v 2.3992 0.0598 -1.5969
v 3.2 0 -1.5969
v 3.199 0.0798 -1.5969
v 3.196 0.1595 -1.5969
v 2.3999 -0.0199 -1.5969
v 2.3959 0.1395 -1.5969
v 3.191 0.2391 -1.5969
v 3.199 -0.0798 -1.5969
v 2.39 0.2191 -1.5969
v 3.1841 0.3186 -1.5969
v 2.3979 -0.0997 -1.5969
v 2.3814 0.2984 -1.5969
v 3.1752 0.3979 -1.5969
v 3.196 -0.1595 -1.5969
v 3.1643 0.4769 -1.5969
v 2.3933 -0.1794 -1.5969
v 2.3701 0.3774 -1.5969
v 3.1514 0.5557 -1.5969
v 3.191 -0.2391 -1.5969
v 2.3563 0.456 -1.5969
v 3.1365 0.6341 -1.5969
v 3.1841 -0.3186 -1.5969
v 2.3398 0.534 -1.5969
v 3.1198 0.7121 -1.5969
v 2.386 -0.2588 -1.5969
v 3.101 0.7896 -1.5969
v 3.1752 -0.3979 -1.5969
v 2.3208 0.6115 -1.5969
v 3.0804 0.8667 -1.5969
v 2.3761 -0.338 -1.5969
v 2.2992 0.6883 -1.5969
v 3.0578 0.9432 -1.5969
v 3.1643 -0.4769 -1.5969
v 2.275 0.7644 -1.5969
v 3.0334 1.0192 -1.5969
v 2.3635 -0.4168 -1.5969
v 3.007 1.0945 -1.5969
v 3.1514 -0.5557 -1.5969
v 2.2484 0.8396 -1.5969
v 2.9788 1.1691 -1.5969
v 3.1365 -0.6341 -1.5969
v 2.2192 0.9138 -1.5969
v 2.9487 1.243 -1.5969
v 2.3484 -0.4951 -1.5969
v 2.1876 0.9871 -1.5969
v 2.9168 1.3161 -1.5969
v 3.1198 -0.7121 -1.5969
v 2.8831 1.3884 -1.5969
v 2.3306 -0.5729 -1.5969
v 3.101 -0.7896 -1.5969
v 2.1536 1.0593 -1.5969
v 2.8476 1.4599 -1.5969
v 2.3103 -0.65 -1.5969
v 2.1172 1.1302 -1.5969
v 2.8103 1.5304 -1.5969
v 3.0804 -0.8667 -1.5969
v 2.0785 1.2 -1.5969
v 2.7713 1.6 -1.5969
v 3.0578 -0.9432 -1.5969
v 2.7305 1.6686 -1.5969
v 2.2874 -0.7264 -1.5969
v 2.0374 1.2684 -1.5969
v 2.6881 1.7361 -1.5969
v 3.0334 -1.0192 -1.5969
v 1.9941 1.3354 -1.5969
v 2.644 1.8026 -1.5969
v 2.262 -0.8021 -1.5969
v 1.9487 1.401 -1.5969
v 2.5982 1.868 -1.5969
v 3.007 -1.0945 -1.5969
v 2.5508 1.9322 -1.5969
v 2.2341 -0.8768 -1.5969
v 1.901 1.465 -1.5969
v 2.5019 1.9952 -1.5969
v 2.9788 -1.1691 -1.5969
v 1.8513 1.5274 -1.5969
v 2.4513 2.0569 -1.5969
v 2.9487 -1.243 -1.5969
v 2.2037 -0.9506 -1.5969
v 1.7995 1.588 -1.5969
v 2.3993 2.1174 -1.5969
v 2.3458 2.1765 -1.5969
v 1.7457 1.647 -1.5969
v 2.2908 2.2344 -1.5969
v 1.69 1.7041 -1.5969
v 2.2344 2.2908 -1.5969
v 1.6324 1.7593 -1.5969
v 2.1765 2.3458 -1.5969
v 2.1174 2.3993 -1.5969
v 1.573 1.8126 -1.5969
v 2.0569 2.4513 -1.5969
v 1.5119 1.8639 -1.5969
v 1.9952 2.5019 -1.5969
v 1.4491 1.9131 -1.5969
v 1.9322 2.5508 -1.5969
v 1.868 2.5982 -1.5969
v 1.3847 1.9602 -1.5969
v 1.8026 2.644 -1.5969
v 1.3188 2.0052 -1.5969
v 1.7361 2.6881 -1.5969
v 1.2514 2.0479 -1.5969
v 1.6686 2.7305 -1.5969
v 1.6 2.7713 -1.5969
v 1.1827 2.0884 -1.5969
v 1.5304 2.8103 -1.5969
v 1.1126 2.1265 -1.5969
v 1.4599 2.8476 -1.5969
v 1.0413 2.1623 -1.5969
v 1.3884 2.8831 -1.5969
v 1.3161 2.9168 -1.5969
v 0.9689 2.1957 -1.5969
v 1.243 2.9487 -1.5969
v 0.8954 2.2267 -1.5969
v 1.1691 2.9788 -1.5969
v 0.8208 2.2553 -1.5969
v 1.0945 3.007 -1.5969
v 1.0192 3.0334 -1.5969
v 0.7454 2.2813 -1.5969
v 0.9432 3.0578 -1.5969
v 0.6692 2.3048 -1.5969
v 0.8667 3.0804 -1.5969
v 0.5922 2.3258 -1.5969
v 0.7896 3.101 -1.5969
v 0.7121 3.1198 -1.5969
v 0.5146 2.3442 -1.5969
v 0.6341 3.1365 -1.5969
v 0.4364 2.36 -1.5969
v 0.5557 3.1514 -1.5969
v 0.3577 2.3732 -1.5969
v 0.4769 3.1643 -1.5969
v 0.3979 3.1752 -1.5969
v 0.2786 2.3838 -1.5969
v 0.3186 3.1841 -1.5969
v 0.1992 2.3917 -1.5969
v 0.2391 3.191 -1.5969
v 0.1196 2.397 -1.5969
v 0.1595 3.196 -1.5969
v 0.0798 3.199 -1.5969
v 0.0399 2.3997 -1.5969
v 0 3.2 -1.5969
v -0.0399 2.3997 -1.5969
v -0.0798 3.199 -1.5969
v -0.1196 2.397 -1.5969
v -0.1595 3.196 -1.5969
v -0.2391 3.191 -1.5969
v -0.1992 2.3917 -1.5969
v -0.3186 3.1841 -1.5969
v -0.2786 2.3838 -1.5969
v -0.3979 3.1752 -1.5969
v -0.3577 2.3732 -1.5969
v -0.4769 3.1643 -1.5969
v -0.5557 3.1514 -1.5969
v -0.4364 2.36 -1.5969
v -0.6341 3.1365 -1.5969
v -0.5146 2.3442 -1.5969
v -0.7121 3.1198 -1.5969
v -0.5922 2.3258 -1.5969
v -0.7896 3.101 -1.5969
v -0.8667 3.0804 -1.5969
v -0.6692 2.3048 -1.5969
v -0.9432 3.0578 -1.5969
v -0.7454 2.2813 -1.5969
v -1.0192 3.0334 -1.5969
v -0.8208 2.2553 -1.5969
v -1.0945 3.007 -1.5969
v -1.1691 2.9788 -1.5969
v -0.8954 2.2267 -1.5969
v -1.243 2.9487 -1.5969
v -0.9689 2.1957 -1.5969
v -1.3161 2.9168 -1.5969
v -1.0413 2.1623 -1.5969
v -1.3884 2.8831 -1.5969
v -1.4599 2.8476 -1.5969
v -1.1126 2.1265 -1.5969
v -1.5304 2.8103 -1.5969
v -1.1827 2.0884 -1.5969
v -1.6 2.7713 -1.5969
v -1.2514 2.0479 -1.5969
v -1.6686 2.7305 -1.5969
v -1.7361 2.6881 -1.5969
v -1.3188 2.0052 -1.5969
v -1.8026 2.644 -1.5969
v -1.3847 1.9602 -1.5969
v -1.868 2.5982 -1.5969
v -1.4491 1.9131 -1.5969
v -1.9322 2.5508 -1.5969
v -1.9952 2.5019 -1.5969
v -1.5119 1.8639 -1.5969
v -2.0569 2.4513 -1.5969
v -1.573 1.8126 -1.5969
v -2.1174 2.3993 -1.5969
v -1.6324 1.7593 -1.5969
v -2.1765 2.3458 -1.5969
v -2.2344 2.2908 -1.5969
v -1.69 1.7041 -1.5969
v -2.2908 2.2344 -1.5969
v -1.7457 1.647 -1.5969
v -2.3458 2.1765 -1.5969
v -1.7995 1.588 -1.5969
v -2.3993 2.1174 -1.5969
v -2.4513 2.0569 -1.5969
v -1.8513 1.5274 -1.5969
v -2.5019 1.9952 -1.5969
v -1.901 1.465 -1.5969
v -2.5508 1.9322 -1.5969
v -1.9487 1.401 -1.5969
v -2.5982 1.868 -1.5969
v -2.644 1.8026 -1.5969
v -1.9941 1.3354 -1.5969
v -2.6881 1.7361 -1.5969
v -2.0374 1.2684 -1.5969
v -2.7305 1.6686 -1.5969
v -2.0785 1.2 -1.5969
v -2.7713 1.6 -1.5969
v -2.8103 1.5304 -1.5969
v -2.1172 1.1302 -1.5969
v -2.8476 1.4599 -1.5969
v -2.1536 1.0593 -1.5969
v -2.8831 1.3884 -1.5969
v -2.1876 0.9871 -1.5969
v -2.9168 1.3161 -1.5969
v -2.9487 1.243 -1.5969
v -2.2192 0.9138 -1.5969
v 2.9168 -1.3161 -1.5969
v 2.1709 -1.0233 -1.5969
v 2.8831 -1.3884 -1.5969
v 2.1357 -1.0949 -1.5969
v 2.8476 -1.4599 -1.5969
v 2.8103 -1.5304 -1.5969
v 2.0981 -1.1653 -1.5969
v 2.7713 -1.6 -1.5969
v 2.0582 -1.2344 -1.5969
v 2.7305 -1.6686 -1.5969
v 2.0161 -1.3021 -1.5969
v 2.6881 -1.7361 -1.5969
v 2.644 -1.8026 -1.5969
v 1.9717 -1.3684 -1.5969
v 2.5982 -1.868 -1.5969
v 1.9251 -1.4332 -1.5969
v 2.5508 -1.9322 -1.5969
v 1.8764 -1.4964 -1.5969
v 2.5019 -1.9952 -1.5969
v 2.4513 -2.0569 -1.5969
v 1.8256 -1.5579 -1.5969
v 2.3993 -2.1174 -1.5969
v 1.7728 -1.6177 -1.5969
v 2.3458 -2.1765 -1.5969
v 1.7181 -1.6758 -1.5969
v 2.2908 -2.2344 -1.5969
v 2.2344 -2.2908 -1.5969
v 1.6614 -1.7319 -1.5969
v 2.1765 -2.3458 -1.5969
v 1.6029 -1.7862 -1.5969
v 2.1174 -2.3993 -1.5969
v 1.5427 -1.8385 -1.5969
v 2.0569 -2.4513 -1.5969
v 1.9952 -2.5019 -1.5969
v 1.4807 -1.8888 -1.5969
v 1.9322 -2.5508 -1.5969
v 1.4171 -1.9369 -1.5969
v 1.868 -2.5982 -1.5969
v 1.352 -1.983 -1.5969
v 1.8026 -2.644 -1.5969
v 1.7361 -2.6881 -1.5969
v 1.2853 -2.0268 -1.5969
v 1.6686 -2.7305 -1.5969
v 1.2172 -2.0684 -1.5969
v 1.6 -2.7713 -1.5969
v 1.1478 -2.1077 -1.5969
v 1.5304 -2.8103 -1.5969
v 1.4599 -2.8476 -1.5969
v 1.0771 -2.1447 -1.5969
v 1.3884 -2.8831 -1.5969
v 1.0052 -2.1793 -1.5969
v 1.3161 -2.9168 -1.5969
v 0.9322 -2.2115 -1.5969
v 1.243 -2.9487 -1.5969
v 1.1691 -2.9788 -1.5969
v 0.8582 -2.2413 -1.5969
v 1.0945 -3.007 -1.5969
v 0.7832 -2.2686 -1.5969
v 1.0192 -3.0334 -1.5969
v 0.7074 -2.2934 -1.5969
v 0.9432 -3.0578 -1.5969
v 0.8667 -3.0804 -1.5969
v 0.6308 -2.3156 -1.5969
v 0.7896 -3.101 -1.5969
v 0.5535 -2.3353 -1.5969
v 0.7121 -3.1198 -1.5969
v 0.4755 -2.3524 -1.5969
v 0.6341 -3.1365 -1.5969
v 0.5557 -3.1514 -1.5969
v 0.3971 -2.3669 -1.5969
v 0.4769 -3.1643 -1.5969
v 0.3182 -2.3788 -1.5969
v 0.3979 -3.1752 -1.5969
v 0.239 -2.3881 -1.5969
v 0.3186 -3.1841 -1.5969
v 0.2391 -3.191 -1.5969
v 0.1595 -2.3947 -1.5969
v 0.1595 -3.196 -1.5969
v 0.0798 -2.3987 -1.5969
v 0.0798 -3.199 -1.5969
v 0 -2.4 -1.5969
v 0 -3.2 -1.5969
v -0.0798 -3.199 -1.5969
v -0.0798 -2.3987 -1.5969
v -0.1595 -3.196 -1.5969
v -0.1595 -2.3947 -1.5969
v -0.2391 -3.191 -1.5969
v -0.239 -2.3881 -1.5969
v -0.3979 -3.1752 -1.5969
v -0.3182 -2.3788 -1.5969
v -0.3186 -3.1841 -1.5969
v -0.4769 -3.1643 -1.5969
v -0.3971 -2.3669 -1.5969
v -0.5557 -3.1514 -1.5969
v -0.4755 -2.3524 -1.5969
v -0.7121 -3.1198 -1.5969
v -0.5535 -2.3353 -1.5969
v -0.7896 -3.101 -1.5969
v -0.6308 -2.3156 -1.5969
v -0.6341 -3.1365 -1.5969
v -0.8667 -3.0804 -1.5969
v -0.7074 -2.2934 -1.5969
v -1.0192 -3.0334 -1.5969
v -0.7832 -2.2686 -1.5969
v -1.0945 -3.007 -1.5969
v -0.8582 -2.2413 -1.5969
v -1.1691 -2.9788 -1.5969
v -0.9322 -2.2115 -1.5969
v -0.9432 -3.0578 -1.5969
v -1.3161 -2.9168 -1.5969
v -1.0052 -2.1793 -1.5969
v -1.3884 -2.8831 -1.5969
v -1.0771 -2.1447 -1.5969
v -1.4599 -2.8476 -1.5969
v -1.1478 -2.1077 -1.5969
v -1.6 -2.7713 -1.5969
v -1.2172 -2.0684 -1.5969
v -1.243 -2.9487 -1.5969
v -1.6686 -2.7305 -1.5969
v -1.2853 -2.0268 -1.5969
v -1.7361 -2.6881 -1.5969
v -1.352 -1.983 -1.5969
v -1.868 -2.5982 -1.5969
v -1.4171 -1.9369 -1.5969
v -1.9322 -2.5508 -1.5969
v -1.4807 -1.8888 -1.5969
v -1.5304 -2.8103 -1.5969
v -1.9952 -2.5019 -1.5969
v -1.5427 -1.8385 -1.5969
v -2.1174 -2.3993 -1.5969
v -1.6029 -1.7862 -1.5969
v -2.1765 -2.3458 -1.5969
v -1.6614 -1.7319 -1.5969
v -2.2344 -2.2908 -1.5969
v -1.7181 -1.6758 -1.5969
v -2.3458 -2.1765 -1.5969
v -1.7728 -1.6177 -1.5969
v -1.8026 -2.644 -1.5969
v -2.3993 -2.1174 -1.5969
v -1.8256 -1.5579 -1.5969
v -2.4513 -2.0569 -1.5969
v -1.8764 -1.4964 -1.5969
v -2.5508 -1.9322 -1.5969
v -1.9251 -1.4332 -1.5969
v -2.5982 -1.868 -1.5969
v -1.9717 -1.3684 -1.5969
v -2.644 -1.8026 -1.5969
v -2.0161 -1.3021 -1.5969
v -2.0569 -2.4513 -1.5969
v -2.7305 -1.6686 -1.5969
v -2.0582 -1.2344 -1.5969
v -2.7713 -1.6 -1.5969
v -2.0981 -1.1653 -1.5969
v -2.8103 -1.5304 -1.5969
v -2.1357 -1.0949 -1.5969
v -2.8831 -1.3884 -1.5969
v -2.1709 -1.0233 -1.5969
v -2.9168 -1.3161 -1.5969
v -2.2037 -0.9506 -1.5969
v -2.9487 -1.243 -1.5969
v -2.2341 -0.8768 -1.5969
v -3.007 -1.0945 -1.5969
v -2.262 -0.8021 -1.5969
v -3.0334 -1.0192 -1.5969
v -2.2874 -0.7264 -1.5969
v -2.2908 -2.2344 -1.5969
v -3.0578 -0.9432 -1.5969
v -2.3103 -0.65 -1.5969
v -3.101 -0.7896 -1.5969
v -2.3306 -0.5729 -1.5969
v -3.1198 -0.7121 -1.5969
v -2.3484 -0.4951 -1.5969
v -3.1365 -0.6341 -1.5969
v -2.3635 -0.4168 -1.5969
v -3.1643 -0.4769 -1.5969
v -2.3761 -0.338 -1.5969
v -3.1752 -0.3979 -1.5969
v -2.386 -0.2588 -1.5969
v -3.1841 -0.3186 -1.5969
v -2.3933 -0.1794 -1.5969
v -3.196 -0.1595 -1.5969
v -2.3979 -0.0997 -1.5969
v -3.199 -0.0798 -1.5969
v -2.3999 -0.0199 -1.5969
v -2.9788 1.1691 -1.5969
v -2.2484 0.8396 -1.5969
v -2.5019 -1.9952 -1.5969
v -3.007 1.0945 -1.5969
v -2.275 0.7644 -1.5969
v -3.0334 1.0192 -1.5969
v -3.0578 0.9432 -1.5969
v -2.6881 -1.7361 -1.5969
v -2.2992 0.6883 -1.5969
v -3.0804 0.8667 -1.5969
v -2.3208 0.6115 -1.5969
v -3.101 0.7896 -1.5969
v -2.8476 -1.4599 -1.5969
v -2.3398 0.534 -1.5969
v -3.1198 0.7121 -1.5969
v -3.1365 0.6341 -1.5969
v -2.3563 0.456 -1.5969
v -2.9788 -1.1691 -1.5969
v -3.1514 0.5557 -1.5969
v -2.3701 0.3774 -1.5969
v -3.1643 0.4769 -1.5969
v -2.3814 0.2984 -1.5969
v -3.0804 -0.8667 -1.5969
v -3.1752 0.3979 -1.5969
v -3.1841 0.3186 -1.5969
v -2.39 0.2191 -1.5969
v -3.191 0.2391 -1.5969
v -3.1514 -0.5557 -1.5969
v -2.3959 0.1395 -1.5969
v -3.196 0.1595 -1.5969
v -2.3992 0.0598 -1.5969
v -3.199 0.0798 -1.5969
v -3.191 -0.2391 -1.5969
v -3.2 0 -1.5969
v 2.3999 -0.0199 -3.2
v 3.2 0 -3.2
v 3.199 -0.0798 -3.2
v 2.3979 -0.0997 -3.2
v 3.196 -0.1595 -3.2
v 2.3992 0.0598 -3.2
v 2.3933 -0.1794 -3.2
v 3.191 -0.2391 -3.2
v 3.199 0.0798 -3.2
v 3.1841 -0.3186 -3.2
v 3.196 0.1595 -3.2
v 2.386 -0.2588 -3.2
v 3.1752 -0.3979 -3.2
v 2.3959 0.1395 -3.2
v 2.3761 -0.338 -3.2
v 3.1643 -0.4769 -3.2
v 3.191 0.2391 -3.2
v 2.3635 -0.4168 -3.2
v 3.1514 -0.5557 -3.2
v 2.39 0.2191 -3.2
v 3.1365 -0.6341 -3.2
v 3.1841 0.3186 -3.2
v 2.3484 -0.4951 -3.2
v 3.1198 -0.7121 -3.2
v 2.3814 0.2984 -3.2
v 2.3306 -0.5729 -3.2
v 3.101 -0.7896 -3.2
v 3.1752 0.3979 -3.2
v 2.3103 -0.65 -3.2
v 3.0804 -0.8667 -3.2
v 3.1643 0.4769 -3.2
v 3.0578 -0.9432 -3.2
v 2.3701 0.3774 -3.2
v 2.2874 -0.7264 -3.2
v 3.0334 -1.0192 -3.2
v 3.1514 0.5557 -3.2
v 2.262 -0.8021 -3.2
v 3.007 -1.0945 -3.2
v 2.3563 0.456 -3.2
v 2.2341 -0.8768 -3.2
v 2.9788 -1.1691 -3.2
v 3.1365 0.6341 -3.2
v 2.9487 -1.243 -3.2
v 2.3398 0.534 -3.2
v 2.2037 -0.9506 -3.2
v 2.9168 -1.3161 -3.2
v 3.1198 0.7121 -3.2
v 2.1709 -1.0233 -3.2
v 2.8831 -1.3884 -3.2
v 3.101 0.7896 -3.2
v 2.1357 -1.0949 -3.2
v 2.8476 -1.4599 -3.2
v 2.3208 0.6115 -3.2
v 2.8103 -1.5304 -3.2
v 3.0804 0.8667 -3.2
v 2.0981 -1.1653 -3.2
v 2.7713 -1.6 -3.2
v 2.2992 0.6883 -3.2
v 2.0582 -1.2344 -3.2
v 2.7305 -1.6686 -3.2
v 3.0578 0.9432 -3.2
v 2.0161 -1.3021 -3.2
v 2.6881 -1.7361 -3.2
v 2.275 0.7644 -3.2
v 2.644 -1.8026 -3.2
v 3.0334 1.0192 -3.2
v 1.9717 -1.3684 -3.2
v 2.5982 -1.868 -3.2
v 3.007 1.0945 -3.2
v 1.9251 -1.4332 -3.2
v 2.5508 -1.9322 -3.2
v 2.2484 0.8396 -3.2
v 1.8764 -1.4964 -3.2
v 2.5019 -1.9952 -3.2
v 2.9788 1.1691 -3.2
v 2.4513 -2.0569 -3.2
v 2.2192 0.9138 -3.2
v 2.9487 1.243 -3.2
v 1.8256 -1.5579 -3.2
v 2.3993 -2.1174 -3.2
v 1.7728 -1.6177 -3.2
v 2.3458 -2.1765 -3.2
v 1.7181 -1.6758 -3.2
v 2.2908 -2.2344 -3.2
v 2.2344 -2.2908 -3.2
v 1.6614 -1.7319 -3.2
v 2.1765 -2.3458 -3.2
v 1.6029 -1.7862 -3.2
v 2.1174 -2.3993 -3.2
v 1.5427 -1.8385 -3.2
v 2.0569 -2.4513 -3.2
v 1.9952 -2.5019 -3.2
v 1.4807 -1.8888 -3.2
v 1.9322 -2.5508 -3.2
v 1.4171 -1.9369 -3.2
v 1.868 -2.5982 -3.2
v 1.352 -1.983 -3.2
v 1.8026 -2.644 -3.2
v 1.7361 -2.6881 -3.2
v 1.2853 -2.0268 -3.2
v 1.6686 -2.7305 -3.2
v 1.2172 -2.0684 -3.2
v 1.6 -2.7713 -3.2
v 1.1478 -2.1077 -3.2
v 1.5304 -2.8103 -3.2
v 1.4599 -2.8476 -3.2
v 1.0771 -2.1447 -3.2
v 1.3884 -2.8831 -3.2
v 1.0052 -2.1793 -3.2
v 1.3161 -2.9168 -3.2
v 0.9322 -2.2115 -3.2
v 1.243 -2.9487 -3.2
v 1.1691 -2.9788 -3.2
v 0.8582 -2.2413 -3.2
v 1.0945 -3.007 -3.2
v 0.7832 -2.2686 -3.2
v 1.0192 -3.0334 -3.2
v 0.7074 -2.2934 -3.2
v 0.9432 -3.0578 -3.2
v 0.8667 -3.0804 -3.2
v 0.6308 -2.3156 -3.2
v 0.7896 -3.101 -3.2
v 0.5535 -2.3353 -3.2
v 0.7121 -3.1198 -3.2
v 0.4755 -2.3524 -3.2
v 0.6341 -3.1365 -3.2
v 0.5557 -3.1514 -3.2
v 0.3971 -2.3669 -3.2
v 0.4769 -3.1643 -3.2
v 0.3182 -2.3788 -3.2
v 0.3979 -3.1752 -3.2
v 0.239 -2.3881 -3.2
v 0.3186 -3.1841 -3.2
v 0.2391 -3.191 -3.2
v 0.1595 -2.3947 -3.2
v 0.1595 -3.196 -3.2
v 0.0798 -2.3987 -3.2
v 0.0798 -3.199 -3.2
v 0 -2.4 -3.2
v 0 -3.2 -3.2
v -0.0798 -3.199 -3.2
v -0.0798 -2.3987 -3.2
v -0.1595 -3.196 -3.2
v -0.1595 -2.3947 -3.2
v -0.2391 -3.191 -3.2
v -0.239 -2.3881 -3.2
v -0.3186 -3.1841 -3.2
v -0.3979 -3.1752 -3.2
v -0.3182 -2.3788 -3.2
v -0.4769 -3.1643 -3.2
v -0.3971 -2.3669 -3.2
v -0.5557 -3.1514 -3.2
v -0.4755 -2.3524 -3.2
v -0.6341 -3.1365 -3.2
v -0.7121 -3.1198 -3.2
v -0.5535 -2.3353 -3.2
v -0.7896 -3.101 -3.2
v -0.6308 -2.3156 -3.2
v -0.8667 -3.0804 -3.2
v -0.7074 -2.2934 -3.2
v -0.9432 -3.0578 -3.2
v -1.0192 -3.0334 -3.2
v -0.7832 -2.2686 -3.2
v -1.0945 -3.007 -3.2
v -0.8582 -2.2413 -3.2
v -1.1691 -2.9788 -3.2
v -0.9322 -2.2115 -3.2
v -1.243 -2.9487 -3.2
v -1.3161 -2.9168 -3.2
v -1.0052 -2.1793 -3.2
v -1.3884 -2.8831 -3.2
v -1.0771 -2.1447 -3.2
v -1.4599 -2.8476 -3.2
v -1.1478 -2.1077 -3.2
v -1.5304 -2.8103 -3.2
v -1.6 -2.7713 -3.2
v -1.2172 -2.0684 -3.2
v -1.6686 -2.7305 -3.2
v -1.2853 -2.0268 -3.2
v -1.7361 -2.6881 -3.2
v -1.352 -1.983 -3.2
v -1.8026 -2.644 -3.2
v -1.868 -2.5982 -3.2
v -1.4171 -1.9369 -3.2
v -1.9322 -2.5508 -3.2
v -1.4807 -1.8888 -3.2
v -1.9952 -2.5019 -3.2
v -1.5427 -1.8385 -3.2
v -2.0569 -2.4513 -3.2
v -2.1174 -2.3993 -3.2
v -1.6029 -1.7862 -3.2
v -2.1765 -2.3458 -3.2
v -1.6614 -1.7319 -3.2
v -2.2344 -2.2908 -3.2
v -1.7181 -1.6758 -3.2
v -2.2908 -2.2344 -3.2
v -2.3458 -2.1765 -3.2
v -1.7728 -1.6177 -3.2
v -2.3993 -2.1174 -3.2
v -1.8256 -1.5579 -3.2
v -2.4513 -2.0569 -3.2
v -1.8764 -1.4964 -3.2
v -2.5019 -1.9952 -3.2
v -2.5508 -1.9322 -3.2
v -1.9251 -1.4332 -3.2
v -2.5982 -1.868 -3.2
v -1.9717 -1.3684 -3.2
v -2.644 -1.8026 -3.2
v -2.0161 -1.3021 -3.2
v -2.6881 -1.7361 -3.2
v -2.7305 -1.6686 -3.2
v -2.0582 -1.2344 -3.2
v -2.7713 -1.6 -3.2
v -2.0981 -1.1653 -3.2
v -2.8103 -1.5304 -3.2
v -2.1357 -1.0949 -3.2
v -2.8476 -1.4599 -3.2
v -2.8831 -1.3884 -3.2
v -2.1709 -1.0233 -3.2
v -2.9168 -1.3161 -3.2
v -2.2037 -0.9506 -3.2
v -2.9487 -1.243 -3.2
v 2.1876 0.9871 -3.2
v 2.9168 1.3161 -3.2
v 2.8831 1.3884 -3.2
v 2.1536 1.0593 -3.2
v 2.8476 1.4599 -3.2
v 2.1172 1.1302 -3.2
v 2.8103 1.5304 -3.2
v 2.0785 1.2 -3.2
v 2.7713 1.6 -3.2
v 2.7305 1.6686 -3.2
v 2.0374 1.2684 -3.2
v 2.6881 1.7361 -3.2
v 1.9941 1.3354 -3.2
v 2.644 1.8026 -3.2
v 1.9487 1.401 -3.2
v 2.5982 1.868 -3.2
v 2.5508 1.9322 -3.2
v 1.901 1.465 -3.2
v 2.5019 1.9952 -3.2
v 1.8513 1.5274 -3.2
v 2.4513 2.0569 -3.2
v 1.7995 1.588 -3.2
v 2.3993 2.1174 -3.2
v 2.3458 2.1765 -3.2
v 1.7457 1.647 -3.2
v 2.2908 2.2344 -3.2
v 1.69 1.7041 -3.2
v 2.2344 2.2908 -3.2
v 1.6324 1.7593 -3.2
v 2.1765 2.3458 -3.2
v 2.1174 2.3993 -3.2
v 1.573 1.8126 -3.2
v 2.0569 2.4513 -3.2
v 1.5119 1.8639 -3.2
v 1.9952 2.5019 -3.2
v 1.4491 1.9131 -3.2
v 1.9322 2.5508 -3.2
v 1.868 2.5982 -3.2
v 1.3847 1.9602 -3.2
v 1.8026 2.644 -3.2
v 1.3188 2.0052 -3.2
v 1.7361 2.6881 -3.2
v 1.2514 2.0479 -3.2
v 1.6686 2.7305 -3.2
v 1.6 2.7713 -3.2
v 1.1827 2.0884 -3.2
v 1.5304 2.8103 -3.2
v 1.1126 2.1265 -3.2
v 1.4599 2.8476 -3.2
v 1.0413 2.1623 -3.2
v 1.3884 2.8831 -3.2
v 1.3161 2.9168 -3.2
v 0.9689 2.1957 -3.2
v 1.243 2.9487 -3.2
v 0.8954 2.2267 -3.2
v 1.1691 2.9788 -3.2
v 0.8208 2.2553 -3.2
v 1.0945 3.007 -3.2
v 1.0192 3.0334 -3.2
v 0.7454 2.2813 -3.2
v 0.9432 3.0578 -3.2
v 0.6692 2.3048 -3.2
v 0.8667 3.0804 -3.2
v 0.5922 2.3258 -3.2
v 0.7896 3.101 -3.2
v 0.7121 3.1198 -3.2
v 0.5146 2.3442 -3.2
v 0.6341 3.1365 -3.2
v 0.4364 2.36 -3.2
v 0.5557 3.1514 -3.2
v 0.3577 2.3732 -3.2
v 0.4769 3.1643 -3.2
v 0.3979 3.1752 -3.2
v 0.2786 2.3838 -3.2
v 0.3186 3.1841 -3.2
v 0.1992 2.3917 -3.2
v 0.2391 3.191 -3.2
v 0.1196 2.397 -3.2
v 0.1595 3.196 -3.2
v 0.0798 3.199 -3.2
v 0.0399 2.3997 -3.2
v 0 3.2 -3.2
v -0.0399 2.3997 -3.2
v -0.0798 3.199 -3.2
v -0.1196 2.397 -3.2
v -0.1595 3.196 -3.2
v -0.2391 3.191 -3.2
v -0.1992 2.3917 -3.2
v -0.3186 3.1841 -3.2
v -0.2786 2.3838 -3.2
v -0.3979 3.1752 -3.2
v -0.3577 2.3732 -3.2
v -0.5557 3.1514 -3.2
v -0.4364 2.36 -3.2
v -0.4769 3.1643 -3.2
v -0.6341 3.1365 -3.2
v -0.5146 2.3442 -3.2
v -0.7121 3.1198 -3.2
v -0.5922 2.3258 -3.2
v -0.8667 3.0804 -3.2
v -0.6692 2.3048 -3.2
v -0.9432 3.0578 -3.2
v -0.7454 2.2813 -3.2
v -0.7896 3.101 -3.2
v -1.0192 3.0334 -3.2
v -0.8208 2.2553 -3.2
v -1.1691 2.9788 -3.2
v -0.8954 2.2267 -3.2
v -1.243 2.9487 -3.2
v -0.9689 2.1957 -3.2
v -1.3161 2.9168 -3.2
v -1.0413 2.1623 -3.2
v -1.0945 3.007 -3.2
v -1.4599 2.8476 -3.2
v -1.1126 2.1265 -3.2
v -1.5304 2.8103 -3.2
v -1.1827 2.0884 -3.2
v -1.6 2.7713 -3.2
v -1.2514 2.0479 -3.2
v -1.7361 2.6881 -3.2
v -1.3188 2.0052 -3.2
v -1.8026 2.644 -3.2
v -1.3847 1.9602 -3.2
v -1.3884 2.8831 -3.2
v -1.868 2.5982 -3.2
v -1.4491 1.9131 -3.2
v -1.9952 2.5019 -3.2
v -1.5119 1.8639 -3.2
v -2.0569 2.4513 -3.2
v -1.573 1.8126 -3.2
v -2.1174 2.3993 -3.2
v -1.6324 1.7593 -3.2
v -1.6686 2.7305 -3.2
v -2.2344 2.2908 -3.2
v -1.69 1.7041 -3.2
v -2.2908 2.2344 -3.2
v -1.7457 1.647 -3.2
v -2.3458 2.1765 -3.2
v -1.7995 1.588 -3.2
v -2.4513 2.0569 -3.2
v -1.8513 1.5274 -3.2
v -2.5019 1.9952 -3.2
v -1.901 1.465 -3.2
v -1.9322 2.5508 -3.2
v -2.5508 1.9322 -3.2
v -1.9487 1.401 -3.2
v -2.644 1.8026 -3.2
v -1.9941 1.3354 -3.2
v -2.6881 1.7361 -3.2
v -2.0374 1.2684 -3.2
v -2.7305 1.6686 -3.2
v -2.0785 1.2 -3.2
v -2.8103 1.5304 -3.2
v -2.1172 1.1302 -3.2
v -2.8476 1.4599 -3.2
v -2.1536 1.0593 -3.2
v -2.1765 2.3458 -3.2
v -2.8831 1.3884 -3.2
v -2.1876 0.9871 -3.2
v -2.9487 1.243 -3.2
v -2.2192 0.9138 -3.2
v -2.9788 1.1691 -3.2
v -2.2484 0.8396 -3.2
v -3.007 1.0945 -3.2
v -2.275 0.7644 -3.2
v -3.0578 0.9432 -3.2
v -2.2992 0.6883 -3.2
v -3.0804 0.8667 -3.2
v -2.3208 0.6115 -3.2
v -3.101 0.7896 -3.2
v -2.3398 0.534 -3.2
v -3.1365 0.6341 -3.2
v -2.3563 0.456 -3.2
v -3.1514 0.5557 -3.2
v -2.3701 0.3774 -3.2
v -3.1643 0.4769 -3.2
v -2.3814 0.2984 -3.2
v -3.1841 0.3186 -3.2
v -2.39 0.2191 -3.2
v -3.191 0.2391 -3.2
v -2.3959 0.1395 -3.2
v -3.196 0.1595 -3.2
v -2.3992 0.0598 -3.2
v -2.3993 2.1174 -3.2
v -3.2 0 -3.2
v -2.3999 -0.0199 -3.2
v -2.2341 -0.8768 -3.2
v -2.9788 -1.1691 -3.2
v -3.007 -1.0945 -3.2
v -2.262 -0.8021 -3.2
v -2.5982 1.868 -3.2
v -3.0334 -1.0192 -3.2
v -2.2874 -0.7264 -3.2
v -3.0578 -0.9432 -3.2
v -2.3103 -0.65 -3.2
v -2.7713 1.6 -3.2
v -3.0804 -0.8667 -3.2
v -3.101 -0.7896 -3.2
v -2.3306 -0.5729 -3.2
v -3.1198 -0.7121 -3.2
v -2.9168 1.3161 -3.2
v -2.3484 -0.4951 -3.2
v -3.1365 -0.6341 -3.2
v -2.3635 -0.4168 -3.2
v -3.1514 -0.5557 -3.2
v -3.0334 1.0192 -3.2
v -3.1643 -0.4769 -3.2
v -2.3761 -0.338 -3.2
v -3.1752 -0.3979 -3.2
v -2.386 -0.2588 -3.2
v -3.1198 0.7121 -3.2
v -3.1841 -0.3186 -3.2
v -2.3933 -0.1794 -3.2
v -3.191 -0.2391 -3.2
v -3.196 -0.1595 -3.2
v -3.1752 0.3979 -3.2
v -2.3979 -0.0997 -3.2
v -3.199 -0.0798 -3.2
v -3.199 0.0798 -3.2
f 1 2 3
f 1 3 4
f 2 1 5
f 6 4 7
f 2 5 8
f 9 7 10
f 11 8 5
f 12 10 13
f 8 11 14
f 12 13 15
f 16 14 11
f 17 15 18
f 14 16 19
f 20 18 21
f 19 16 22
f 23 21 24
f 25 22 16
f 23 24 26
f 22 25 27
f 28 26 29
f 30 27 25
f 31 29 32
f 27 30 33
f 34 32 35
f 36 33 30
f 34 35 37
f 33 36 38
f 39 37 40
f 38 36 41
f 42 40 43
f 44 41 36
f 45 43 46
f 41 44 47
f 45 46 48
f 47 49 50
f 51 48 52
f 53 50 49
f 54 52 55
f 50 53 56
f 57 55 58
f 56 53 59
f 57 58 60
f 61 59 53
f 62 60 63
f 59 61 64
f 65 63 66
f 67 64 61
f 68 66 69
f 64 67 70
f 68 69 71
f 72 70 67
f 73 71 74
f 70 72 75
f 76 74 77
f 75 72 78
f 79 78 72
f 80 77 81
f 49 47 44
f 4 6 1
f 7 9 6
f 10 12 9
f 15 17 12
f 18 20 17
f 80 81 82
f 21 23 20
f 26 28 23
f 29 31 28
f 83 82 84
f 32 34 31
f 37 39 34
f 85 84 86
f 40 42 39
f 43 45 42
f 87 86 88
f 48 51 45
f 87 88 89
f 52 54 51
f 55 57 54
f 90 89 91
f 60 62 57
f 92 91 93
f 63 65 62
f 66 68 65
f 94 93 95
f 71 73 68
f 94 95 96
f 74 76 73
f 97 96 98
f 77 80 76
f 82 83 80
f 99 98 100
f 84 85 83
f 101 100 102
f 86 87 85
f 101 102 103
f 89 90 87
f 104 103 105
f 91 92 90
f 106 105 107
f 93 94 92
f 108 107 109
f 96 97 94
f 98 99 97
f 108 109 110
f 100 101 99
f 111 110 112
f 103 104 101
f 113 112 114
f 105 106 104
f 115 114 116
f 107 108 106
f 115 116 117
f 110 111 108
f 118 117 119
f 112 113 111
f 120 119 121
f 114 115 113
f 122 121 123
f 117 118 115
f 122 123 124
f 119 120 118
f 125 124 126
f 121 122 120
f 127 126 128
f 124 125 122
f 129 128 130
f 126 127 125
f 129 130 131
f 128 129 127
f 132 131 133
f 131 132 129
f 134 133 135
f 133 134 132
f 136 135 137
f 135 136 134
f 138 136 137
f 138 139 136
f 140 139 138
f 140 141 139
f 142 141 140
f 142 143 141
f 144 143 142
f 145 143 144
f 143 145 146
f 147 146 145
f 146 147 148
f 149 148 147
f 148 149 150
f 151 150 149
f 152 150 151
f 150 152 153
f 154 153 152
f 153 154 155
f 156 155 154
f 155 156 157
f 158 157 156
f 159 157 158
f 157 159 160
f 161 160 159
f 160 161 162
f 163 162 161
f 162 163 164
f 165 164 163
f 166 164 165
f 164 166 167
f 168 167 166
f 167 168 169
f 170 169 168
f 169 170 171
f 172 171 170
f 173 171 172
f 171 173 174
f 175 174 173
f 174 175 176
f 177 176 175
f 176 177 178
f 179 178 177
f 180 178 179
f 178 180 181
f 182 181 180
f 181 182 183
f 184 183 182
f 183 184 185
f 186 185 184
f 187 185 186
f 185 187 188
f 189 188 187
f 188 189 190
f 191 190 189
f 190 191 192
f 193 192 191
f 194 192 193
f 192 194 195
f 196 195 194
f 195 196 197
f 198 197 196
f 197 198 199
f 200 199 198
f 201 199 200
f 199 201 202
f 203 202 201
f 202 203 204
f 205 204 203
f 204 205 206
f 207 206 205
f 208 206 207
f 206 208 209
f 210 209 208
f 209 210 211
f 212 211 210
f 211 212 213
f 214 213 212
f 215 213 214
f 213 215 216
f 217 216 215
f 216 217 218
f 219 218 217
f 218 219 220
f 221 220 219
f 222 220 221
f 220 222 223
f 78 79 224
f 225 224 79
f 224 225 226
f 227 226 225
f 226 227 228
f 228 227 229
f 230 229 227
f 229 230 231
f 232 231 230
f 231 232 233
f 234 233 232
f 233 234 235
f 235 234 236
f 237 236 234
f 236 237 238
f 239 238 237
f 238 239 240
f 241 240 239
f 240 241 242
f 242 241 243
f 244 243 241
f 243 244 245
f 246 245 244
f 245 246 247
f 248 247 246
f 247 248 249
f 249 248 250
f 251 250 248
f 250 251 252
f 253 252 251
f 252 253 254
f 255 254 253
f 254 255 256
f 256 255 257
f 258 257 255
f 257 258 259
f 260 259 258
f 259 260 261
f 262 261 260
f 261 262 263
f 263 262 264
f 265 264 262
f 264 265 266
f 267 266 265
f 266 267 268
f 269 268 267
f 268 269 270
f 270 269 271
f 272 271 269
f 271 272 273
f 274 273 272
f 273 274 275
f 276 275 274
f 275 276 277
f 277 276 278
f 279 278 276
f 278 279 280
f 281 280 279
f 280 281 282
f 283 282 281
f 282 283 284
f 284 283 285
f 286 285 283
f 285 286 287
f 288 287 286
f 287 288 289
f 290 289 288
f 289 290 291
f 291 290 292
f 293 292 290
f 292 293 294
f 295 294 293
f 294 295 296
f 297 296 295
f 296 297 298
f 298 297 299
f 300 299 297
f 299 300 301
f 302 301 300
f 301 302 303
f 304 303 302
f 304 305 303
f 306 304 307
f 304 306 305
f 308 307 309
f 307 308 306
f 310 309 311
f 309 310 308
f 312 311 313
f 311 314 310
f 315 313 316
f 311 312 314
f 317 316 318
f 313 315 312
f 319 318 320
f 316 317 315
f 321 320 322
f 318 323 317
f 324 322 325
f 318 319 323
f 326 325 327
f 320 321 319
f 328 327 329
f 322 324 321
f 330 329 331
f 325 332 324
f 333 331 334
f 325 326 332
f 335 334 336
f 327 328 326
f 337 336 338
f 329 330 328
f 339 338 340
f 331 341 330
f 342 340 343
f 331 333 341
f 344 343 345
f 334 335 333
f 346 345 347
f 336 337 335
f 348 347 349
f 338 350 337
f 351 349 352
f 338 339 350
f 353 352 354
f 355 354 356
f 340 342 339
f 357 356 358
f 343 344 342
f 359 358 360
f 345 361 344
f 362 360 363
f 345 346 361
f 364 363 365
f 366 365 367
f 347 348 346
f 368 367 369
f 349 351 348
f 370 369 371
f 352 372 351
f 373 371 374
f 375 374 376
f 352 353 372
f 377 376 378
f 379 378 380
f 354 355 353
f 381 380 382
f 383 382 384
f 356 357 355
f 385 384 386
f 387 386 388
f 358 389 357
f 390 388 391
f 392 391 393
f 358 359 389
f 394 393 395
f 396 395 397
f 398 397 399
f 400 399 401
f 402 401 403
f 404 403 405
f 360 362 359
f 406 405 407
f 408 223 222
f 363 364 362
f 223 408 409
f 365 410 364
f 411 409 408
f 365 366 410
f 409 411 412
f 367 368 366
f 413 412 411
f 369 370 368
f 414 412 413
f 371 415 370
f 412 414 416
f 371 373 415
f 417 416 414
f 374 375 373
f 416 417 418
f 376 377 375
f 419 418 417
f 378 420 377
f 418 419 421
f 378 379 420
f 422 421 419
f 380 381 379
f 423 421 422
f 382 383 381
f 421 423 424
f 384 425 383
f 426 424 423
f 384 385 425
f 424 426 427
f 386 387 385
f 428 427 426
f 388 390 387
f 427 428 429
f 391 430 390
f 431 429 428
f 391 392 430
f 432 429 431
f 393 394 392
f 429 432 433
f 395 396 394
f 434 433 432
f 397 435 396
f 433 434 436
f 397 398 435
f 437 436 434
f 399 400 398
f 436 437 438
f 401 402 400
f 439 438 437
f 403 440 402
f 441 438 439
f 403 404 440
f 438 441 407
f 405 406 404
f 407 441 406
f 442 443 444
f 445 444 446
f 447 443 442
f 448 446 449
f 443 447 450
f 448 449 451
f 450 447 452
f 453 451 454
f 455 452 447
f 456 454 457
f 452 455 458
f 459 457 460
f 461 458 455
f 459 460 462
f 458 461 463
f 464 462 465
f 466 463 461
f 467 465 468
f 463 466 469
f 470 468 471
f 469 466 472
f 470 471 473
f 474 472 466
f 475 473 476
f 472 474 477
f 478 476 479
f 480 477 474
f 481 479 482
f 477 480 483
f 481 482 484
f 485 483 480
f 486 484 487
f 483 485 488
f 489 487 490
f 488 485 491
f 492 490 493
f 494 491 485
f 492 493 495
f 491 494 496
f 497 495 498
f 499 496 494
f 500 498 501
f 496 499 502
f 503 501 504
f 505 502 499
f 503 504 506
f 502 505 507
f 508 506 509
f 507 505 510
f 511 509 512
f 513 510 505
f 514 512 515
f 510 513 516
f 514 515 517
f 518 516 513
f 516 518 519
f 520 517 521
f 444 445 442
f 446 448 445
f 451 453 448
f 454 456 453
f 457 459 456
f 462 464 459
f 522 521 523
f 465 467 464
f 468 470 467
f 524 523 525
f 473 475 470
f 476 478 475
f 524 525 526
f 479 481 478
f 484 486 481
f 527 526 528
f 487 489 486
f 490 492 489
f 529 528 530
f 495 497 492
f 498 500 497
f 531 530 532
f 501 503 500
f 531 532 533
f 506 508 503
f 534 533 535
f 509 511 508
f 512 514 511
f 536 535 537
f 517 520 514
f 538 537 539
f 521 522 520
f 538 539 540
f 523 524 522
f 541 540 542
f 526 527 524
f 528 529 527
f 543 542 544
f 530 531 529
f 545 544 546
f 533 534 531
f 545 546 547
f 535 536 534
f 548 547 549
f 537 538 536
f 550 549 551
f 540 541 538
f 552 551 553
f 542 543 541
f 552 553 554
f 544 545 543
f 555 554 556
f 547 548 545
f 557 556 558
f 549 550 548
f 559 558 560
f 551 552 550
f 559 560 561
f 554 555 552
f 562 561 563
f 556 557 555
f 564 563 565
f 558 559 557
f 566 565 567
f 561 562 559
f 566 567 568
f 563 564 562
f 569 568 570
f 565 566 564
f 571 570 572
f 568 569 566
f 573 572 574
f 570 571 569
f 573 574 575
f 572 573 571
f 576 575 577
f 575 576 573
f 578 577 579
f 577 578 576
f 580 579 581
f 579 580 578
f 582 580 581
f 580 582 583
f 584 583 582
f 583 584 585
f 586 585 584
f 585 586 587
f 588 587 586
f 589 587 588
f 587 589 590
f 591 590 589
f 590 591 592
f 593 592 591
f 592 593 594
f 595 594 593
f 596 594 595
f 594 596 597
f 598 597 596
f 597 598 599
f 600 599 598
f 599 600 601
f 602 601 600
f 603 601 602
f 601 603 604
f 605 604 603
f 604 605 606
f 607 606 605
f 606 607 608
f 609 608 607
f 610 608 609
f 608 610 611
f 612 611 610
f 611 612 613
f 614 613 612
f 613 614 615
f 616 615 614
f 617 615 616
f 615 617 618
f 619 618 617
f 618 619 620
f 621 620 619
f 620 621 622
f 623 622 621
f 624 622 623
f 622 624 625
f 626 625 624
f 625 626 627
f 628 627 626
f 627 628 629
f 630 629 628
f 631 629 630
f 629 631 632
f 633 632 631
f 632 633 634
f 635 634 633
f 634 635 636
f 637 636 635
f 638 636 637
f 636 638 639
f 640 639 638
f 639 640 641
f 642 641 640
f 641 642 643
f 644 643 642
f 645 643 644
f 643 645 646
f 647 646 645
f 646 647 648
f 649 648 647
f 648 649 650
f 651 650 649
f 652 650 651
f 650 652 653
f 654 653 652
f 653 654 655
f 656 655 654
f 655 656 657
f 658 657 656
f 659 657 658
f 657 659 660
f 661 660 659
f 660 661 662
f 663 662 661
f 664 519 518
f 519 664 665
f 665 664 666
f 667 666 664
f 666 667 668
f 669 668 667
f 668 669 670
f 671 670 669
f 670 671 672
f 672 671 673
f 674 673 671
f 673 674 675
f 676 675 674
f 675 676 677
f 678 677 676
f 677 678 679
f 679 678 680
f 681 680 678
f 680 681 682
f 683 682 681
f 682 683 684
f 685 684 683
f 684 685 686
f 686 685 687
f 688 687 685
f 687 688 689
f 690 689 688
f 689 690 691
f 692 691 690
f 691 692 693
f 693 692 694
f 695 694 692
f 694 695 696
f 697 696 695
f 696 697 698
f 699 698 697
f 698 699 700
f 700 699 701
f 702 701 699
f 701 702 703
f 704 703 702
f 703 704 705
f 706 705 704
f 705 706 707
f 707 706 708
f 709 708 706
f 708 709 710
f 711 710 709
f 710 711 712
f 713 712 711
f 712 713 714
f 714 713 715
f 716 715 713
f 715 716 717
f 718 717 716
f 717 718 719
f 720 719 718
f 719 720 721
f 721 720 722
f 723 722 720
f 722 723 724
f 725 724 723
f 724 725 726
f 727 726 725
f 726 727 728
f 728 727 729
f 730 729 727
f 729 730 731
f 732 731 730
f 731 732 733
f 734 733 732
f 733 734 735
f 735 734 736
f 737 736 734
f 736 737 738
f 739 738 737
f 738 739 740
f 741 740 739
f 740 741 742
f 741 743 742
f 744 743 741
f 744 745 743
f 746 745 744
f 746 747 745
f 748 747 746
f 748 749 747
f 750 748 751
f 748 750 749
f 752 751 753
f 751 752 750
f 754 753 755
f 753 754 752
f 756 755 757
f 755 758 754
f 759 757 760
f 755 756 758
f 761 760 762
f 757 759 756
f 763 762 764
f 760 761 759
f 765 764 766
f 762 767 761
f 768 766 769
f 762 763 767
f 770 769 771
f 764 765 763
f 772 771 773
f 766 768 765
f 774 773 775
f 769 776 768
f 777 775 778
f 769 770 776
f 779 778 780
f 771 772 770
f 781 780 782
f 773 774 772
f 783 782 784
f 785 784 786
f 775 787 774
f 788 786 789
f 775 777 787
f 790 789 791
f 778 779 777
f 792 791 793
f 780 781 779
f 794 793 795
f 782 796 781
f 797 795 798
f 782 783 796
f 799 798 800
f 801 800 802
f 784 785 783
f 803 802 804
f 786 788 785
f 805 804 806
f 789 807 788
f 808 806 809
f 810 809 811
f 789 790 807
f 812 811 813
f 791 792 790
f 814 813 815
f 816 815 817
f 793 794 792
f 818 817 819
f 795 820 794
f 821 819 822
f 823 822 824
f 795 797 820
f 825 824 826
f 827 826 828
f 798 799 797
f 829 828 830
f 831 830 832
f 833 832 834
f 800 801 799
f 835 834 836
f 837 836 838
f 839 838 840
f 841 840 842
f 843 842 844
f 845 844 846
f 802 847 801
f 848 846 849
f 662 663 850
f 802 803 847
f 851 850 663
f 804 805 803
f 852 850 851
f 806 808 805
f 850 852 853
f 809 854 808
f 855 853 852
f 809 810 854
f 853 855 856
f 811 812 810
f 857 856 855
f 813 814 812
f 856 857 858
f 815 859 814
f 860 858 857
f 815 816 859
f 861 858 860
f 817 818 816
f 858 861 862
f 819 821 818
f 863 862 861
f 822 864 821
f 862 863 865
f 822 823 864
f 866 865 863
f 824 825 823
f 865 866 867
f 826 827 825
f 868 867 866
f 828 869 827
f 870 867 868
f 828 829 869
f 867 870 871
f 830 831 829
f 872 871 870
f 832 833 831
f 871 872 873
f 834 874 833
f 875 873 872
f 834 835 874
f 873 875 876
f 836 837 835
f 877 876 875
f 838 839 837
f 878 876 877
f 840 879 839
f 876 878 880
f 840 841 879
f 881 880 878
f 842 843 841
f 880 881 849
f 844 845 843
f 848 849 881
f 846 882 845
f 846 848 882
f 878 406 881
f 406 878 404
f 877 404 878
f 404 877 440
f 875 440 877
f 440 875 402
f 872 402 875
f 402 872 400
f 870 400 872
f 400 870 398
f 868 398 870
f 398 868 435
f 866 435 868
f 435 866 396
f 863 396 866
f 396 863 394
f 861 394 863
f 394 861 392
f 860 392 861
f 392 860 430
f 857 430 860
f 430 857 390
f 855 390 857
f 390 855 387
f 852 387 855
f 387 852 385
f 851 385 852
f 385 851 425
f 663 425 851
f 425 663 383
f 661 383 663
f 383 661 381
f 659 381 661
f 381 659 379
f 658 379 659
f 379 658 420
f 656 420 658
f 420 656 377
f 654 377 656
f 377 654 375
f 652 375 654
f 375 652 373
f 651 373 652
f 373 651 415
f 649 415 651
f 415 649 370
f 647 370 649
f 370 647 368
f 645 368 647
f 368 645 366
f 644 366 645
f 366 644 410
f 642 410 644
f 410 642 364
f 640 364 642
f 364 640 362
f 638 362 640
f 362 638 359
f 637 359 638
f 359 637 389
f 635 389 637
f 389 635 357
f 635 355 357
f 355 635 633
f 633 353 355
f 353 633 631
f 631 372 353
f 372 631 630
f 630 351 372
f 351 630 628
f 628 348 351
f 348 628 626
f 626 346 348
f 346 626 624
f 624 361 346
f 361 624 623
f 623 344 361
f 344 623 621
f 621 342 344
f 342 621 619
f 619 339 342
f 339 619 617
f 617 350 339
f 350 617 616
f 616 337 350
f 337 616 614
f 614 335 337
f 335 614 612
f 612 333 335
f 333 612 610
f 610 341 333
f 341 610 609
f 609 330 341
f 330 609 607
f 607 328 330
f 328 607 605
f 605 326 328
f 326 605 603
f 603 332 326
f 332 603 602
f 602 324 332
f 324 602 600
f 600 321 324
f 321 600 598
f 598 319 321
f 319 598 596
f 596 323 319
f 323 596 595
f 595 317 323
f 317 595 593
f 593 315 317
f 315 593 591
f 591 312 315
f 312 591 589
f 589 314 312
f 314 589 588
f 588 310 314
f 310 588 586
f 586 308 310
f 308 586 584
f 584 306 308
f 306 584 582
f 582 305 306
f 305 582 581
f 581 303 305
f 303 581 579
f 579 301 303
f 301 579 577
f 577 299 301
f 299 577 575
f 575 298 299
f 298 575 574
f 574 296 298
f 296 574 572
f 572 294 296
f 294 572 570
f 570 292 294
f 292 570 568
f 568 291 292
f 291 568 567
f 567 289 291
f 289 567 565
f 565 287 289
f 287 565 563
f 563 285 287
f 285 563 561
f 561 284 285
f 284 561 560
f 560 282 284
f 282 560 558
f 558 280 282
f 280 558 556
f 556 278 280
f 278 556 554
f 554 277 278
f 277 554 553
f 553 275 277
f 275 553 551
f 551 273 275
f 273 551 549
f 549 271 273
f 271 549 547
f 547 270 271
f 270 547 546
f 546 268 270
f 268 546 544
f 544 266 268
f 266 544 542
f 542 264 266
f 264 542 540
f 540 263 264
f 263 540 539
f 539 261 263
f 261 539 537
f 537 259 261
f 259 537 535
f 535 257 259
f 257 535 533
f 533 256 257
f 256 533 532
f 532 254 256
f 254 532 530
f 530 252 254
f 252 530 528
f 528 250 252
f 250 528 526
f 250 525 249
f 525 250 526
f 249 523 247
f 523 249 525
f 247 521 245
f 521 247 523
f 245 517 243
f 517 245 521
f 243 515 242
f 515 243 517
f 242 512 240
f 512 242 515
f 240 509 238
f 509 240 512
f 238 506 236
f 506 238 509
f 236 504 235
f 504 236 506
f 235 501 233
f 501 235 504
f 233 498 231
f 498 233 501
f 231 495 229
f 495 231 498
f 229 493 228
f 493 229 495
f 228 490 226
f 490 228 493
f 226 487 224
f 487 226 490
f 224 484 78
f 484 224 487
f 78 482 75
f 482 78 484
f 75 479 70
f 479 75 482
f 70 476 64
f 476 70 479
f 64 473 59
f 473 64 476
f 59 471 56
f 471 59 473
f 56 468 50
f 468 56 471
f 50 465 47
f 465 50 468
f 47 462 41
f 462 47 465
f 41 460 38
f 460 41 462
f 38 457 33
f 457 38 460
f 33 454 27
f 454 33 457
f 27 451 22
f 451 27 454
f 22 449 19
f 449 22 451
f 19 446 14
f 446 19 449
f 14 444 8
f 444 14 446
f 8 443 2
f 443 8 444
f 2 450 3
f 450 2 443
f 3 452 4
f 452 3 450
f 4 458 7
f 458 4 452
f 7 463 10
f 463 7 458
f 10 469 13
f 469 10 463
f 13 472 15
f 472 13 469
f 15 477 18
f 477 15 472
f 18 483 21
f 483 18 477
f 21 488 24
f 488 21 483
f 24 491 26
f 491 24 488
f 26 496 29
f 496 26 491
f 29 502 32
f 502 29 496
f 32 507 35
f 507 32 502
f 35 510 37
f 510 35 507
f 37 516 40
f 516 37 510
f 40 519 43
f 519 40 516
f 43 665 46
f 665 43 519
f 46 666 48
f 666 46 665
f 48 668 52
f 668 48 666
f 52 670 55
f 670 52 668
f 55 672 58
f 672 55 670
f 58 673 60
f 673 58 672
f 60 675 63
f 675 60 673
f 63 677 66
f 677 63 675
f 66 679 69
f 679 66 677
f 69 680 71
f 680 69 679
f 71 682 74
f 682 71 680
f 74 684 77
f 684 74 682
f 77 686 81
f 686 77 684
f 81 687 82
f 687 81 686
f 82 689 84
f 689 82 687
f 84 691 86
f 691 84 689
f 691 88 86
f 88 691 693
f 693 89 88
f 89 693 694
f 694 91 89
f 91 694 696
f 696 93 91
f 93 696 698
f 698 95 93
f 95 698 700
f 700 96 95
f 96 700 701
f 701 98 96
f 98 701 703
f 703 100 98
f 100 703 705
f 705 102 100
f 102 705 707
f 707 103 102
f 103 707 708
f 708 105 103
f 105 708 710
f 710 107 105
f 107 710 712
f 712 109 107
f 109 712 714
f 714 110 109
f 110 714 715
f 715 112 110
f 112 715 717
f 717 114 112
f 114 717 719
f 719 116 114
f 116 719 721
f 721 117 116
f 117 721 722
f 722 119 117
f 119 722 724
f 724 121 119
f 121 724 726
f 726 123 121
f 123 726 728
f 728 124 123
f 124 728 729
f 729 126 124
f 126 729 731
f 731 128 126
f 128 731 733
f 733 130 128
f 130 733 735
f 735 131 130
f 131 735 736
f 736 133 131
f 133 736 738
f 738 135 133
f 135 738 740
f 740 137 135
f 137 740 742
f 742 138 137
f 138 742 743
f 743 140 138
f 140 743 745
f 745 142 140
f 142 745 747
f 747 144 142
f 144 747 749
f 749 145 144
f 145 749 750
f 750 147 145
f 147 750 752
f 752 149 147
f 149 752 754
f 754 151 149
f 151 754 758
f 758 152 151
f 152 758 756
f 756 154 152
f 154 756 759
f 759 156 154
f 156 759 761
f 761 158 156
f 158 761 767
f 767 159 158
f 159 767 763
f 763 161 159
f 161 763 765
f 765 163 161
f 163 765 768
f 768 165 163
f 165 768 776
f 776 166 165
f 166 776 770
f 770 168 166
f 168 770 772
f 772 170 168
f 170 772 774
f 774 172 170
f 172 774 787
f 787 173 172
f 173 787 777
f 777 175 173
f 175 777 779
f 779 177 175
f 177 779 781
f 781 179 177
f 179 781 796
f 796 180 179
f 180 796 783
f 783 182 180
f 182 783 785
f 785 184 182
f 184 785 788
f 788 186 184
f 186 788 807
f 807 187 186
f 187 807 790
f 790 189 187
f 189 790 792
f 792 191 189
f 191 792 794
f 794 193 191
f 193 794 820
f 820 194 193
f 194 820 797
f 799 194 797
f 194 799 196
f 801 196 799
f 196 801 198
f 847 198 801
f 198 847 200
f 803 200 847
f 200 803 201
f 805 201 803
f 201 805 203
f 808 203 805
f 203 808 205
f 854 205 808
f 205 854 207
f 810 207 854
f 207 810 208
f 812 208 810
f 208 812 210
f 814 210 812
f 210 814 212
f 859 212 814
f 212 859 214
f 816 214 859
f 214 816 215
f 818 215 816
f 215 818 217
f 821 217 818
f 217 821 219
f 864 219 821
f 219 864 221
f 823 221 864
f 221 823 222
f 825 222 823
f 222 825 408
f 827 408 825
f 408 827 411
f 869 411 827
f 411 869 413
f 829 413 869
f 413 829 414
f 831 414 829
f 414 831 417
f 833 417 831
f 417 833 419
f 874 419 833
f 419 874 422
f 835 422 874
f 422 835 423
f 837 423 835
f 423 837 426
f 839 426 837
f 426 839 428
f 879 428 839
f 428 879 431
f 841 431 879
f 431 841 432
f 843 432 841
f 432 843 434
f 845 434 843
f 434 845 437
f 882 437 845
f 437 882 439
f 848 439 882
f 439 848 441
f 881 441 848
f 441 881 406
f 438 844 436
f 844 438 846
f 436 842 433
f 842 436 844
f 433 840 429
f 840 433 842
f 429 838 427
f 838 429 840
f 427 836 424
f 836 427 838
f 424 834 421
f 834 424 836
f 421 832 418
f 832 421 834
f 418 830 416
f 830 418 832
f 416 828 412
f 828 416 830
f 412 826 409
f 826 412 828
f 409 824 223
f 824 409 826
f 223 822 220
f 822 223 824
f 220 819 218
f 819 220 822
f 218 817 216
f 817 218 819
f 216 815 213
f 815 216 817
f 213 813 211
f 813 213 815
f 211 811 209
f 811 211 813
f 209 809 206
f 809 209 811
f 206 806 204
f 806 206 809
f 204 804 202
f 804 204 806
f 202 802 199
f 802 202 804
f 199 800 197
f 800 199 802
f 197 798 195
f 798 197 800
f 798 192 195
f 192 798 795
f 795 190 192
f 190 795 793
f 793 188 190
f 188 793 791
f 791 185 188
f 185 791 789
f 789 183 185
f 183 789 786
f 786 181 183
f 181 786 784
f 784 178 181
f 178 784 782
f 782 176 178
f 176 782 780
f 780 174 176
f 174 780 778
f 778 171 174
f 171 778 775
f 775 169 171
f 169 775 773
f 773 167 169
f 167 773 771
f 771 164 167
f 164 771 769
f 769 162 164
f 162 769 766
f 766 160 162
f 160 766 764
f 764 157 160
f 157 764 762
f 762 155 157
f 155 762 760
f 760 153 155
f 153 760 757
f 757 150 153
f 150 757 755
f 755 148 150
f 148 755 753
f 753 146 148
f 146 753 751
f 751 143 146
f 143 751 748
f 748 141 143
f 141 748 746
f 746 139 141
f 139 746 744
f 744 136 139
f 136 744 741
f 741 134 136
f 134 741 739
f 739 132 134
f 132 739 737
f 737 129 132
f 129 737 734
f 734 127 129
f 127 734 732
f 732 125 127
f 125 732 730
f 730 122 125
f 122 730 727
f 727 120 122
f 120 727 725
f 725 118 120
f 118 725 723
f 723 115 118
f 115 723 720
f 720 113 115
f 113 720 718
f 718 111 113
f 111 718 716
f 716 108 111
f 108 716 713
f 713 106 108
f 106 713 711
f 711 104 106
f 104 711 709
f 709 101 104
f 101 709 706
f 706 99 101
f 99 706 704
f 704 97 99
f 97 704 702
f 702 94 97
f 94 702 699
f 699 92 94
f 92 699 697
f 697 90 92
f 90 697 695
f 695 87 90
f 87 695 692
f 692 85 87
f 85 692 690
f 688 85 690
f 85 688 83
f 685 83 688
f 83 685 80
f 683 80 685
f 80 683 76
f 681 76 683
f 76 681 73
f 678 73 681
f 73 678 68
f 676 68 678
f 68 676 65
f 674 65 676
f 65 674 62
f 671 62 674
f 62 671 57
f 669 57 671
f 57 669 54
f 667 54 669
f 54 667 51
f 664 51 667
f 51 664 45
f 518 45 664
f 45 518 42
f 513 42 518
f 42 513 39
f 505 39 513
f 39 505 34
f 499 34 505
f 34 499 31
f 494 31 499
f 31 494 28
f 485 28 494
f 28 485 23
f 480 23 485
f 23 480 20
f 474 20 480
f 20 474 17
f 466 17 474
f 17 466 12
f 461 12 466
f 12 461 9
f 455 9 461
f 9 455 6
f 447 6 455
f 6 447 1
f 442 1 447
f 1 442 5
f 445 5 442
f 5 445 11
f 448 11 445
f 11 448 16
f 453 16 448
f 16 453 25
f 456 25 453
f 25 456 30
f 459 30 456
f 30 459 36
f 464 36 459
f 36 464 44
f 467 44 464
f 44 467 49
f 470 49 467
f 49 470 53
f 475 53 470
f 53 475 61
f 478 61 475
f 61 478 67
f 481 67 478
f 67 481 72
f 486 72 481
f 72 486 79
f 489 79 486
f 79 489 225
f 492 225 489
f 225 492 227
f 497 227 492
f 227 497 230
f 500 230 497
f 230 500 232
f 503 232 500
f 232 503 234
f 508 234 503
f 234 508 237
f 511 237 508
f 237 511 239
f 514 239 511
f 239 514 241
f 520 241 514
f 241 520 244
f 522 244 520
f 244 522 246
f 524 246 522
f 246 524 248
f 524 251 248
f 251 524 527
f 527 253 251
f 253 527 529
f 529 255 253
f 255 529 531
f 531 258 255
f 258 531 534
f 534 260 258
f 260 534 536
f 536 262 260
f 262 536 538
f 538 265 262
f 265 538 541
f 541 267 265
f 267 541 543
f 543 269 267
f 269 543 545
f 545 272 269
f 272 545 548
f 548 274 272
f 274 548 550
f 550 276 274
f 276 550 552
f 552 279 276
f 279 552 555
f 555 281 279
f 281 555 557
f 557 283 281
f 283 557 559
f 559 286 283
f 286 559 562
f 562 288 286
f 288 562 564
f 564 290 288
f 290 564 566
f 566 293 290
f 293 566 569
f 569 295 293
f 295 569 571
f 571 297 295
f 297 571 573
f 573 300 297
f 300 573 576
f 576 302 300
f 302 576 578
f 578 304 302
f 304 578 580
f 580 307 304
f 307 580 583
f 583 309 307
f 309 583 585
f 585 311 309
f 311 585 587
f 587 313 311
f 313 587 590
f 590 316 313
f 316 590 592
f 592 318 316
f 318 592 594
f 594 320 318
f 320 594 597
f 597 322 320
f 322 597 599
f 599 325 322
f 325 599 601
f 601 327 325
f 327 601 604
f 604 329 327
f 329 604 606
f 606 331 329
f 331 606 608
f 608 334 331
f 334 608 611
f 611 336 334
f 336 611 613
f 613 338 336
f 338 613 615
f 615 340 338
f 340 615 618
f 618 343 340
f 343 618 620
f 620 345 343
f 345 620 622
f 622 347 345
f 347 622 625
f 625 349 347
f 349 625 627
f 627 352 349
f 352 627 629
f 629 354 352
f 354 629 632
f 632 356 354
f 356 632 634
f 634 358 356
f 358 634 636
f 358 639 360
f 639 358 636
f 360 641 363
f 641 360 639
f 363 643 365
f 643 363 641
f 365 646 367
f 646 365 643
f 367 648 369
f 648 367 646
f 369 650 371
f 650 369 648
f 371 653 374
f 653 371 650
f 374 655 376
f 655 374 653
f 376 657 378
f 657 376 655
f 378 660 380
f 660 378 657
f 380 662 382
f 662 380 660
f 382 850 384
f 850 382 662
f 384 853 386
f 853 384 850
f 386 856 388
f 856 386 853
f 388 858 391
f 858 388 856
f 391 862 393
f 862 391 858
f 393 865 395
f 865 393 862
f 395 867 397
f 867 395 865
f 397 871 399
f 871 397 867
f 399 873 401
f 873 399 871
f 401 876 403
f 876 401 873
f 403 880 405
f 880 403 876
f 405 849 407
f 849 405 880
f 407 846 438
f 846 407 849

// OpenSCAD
use <../lib.scad>
use <3068bps1.scad>
$fa=1; $fs=0.2;
function ldraw_lib__3068ps1(realsolid=false) = [
// 0 ~Moved to 3068bps1
// 0 Name: 3068ps1.dat
// 0 Author: [PTadmin]
// 0 !LDRAW_ORG Part UPDATE 2002-04
// 0 !LICENSE Licensed under CC BY 4.0 : see CAreadme.txt
// 
// 0 BFC CERTIFY CCW
  [0,"BFC","CERTIFY"],
  [0,"BFC","CCW"],
// 
// 0 !HISTORY 2001-12-31 [PTadmin] Official Update 2001-03
// 0 !HISTORY 2002-08-18 [PTadmin] Official Update 2002-04
// 0 !HISTORY 2007-06-13 [PTadmin] Header formatted for Contributor Agreement
// 0 !HISTORY 2008-07-01 [PTadmin] Official Update 2008-01
// 
// 
// 1 16 0 0 0 1 0 0 0 1 0 0 0 1 3068bps1.dat
  [1,16,0,0,0,1,0,0,0,1,0,0,0,1, ldraw_lib__3068bps1(realsolid)],
];
module ldraw_lib__3068ps1(step=0, col=false, unit=2/5, alt=false, line=0.2, solid=!$preview)
    makepoly(ldraw_lib__3068ps1(solid), step=step, col=col, unit=unit, alt=alt, line=line, solid=solid);
ldraw_lib__3068ps1(line=0.2);
